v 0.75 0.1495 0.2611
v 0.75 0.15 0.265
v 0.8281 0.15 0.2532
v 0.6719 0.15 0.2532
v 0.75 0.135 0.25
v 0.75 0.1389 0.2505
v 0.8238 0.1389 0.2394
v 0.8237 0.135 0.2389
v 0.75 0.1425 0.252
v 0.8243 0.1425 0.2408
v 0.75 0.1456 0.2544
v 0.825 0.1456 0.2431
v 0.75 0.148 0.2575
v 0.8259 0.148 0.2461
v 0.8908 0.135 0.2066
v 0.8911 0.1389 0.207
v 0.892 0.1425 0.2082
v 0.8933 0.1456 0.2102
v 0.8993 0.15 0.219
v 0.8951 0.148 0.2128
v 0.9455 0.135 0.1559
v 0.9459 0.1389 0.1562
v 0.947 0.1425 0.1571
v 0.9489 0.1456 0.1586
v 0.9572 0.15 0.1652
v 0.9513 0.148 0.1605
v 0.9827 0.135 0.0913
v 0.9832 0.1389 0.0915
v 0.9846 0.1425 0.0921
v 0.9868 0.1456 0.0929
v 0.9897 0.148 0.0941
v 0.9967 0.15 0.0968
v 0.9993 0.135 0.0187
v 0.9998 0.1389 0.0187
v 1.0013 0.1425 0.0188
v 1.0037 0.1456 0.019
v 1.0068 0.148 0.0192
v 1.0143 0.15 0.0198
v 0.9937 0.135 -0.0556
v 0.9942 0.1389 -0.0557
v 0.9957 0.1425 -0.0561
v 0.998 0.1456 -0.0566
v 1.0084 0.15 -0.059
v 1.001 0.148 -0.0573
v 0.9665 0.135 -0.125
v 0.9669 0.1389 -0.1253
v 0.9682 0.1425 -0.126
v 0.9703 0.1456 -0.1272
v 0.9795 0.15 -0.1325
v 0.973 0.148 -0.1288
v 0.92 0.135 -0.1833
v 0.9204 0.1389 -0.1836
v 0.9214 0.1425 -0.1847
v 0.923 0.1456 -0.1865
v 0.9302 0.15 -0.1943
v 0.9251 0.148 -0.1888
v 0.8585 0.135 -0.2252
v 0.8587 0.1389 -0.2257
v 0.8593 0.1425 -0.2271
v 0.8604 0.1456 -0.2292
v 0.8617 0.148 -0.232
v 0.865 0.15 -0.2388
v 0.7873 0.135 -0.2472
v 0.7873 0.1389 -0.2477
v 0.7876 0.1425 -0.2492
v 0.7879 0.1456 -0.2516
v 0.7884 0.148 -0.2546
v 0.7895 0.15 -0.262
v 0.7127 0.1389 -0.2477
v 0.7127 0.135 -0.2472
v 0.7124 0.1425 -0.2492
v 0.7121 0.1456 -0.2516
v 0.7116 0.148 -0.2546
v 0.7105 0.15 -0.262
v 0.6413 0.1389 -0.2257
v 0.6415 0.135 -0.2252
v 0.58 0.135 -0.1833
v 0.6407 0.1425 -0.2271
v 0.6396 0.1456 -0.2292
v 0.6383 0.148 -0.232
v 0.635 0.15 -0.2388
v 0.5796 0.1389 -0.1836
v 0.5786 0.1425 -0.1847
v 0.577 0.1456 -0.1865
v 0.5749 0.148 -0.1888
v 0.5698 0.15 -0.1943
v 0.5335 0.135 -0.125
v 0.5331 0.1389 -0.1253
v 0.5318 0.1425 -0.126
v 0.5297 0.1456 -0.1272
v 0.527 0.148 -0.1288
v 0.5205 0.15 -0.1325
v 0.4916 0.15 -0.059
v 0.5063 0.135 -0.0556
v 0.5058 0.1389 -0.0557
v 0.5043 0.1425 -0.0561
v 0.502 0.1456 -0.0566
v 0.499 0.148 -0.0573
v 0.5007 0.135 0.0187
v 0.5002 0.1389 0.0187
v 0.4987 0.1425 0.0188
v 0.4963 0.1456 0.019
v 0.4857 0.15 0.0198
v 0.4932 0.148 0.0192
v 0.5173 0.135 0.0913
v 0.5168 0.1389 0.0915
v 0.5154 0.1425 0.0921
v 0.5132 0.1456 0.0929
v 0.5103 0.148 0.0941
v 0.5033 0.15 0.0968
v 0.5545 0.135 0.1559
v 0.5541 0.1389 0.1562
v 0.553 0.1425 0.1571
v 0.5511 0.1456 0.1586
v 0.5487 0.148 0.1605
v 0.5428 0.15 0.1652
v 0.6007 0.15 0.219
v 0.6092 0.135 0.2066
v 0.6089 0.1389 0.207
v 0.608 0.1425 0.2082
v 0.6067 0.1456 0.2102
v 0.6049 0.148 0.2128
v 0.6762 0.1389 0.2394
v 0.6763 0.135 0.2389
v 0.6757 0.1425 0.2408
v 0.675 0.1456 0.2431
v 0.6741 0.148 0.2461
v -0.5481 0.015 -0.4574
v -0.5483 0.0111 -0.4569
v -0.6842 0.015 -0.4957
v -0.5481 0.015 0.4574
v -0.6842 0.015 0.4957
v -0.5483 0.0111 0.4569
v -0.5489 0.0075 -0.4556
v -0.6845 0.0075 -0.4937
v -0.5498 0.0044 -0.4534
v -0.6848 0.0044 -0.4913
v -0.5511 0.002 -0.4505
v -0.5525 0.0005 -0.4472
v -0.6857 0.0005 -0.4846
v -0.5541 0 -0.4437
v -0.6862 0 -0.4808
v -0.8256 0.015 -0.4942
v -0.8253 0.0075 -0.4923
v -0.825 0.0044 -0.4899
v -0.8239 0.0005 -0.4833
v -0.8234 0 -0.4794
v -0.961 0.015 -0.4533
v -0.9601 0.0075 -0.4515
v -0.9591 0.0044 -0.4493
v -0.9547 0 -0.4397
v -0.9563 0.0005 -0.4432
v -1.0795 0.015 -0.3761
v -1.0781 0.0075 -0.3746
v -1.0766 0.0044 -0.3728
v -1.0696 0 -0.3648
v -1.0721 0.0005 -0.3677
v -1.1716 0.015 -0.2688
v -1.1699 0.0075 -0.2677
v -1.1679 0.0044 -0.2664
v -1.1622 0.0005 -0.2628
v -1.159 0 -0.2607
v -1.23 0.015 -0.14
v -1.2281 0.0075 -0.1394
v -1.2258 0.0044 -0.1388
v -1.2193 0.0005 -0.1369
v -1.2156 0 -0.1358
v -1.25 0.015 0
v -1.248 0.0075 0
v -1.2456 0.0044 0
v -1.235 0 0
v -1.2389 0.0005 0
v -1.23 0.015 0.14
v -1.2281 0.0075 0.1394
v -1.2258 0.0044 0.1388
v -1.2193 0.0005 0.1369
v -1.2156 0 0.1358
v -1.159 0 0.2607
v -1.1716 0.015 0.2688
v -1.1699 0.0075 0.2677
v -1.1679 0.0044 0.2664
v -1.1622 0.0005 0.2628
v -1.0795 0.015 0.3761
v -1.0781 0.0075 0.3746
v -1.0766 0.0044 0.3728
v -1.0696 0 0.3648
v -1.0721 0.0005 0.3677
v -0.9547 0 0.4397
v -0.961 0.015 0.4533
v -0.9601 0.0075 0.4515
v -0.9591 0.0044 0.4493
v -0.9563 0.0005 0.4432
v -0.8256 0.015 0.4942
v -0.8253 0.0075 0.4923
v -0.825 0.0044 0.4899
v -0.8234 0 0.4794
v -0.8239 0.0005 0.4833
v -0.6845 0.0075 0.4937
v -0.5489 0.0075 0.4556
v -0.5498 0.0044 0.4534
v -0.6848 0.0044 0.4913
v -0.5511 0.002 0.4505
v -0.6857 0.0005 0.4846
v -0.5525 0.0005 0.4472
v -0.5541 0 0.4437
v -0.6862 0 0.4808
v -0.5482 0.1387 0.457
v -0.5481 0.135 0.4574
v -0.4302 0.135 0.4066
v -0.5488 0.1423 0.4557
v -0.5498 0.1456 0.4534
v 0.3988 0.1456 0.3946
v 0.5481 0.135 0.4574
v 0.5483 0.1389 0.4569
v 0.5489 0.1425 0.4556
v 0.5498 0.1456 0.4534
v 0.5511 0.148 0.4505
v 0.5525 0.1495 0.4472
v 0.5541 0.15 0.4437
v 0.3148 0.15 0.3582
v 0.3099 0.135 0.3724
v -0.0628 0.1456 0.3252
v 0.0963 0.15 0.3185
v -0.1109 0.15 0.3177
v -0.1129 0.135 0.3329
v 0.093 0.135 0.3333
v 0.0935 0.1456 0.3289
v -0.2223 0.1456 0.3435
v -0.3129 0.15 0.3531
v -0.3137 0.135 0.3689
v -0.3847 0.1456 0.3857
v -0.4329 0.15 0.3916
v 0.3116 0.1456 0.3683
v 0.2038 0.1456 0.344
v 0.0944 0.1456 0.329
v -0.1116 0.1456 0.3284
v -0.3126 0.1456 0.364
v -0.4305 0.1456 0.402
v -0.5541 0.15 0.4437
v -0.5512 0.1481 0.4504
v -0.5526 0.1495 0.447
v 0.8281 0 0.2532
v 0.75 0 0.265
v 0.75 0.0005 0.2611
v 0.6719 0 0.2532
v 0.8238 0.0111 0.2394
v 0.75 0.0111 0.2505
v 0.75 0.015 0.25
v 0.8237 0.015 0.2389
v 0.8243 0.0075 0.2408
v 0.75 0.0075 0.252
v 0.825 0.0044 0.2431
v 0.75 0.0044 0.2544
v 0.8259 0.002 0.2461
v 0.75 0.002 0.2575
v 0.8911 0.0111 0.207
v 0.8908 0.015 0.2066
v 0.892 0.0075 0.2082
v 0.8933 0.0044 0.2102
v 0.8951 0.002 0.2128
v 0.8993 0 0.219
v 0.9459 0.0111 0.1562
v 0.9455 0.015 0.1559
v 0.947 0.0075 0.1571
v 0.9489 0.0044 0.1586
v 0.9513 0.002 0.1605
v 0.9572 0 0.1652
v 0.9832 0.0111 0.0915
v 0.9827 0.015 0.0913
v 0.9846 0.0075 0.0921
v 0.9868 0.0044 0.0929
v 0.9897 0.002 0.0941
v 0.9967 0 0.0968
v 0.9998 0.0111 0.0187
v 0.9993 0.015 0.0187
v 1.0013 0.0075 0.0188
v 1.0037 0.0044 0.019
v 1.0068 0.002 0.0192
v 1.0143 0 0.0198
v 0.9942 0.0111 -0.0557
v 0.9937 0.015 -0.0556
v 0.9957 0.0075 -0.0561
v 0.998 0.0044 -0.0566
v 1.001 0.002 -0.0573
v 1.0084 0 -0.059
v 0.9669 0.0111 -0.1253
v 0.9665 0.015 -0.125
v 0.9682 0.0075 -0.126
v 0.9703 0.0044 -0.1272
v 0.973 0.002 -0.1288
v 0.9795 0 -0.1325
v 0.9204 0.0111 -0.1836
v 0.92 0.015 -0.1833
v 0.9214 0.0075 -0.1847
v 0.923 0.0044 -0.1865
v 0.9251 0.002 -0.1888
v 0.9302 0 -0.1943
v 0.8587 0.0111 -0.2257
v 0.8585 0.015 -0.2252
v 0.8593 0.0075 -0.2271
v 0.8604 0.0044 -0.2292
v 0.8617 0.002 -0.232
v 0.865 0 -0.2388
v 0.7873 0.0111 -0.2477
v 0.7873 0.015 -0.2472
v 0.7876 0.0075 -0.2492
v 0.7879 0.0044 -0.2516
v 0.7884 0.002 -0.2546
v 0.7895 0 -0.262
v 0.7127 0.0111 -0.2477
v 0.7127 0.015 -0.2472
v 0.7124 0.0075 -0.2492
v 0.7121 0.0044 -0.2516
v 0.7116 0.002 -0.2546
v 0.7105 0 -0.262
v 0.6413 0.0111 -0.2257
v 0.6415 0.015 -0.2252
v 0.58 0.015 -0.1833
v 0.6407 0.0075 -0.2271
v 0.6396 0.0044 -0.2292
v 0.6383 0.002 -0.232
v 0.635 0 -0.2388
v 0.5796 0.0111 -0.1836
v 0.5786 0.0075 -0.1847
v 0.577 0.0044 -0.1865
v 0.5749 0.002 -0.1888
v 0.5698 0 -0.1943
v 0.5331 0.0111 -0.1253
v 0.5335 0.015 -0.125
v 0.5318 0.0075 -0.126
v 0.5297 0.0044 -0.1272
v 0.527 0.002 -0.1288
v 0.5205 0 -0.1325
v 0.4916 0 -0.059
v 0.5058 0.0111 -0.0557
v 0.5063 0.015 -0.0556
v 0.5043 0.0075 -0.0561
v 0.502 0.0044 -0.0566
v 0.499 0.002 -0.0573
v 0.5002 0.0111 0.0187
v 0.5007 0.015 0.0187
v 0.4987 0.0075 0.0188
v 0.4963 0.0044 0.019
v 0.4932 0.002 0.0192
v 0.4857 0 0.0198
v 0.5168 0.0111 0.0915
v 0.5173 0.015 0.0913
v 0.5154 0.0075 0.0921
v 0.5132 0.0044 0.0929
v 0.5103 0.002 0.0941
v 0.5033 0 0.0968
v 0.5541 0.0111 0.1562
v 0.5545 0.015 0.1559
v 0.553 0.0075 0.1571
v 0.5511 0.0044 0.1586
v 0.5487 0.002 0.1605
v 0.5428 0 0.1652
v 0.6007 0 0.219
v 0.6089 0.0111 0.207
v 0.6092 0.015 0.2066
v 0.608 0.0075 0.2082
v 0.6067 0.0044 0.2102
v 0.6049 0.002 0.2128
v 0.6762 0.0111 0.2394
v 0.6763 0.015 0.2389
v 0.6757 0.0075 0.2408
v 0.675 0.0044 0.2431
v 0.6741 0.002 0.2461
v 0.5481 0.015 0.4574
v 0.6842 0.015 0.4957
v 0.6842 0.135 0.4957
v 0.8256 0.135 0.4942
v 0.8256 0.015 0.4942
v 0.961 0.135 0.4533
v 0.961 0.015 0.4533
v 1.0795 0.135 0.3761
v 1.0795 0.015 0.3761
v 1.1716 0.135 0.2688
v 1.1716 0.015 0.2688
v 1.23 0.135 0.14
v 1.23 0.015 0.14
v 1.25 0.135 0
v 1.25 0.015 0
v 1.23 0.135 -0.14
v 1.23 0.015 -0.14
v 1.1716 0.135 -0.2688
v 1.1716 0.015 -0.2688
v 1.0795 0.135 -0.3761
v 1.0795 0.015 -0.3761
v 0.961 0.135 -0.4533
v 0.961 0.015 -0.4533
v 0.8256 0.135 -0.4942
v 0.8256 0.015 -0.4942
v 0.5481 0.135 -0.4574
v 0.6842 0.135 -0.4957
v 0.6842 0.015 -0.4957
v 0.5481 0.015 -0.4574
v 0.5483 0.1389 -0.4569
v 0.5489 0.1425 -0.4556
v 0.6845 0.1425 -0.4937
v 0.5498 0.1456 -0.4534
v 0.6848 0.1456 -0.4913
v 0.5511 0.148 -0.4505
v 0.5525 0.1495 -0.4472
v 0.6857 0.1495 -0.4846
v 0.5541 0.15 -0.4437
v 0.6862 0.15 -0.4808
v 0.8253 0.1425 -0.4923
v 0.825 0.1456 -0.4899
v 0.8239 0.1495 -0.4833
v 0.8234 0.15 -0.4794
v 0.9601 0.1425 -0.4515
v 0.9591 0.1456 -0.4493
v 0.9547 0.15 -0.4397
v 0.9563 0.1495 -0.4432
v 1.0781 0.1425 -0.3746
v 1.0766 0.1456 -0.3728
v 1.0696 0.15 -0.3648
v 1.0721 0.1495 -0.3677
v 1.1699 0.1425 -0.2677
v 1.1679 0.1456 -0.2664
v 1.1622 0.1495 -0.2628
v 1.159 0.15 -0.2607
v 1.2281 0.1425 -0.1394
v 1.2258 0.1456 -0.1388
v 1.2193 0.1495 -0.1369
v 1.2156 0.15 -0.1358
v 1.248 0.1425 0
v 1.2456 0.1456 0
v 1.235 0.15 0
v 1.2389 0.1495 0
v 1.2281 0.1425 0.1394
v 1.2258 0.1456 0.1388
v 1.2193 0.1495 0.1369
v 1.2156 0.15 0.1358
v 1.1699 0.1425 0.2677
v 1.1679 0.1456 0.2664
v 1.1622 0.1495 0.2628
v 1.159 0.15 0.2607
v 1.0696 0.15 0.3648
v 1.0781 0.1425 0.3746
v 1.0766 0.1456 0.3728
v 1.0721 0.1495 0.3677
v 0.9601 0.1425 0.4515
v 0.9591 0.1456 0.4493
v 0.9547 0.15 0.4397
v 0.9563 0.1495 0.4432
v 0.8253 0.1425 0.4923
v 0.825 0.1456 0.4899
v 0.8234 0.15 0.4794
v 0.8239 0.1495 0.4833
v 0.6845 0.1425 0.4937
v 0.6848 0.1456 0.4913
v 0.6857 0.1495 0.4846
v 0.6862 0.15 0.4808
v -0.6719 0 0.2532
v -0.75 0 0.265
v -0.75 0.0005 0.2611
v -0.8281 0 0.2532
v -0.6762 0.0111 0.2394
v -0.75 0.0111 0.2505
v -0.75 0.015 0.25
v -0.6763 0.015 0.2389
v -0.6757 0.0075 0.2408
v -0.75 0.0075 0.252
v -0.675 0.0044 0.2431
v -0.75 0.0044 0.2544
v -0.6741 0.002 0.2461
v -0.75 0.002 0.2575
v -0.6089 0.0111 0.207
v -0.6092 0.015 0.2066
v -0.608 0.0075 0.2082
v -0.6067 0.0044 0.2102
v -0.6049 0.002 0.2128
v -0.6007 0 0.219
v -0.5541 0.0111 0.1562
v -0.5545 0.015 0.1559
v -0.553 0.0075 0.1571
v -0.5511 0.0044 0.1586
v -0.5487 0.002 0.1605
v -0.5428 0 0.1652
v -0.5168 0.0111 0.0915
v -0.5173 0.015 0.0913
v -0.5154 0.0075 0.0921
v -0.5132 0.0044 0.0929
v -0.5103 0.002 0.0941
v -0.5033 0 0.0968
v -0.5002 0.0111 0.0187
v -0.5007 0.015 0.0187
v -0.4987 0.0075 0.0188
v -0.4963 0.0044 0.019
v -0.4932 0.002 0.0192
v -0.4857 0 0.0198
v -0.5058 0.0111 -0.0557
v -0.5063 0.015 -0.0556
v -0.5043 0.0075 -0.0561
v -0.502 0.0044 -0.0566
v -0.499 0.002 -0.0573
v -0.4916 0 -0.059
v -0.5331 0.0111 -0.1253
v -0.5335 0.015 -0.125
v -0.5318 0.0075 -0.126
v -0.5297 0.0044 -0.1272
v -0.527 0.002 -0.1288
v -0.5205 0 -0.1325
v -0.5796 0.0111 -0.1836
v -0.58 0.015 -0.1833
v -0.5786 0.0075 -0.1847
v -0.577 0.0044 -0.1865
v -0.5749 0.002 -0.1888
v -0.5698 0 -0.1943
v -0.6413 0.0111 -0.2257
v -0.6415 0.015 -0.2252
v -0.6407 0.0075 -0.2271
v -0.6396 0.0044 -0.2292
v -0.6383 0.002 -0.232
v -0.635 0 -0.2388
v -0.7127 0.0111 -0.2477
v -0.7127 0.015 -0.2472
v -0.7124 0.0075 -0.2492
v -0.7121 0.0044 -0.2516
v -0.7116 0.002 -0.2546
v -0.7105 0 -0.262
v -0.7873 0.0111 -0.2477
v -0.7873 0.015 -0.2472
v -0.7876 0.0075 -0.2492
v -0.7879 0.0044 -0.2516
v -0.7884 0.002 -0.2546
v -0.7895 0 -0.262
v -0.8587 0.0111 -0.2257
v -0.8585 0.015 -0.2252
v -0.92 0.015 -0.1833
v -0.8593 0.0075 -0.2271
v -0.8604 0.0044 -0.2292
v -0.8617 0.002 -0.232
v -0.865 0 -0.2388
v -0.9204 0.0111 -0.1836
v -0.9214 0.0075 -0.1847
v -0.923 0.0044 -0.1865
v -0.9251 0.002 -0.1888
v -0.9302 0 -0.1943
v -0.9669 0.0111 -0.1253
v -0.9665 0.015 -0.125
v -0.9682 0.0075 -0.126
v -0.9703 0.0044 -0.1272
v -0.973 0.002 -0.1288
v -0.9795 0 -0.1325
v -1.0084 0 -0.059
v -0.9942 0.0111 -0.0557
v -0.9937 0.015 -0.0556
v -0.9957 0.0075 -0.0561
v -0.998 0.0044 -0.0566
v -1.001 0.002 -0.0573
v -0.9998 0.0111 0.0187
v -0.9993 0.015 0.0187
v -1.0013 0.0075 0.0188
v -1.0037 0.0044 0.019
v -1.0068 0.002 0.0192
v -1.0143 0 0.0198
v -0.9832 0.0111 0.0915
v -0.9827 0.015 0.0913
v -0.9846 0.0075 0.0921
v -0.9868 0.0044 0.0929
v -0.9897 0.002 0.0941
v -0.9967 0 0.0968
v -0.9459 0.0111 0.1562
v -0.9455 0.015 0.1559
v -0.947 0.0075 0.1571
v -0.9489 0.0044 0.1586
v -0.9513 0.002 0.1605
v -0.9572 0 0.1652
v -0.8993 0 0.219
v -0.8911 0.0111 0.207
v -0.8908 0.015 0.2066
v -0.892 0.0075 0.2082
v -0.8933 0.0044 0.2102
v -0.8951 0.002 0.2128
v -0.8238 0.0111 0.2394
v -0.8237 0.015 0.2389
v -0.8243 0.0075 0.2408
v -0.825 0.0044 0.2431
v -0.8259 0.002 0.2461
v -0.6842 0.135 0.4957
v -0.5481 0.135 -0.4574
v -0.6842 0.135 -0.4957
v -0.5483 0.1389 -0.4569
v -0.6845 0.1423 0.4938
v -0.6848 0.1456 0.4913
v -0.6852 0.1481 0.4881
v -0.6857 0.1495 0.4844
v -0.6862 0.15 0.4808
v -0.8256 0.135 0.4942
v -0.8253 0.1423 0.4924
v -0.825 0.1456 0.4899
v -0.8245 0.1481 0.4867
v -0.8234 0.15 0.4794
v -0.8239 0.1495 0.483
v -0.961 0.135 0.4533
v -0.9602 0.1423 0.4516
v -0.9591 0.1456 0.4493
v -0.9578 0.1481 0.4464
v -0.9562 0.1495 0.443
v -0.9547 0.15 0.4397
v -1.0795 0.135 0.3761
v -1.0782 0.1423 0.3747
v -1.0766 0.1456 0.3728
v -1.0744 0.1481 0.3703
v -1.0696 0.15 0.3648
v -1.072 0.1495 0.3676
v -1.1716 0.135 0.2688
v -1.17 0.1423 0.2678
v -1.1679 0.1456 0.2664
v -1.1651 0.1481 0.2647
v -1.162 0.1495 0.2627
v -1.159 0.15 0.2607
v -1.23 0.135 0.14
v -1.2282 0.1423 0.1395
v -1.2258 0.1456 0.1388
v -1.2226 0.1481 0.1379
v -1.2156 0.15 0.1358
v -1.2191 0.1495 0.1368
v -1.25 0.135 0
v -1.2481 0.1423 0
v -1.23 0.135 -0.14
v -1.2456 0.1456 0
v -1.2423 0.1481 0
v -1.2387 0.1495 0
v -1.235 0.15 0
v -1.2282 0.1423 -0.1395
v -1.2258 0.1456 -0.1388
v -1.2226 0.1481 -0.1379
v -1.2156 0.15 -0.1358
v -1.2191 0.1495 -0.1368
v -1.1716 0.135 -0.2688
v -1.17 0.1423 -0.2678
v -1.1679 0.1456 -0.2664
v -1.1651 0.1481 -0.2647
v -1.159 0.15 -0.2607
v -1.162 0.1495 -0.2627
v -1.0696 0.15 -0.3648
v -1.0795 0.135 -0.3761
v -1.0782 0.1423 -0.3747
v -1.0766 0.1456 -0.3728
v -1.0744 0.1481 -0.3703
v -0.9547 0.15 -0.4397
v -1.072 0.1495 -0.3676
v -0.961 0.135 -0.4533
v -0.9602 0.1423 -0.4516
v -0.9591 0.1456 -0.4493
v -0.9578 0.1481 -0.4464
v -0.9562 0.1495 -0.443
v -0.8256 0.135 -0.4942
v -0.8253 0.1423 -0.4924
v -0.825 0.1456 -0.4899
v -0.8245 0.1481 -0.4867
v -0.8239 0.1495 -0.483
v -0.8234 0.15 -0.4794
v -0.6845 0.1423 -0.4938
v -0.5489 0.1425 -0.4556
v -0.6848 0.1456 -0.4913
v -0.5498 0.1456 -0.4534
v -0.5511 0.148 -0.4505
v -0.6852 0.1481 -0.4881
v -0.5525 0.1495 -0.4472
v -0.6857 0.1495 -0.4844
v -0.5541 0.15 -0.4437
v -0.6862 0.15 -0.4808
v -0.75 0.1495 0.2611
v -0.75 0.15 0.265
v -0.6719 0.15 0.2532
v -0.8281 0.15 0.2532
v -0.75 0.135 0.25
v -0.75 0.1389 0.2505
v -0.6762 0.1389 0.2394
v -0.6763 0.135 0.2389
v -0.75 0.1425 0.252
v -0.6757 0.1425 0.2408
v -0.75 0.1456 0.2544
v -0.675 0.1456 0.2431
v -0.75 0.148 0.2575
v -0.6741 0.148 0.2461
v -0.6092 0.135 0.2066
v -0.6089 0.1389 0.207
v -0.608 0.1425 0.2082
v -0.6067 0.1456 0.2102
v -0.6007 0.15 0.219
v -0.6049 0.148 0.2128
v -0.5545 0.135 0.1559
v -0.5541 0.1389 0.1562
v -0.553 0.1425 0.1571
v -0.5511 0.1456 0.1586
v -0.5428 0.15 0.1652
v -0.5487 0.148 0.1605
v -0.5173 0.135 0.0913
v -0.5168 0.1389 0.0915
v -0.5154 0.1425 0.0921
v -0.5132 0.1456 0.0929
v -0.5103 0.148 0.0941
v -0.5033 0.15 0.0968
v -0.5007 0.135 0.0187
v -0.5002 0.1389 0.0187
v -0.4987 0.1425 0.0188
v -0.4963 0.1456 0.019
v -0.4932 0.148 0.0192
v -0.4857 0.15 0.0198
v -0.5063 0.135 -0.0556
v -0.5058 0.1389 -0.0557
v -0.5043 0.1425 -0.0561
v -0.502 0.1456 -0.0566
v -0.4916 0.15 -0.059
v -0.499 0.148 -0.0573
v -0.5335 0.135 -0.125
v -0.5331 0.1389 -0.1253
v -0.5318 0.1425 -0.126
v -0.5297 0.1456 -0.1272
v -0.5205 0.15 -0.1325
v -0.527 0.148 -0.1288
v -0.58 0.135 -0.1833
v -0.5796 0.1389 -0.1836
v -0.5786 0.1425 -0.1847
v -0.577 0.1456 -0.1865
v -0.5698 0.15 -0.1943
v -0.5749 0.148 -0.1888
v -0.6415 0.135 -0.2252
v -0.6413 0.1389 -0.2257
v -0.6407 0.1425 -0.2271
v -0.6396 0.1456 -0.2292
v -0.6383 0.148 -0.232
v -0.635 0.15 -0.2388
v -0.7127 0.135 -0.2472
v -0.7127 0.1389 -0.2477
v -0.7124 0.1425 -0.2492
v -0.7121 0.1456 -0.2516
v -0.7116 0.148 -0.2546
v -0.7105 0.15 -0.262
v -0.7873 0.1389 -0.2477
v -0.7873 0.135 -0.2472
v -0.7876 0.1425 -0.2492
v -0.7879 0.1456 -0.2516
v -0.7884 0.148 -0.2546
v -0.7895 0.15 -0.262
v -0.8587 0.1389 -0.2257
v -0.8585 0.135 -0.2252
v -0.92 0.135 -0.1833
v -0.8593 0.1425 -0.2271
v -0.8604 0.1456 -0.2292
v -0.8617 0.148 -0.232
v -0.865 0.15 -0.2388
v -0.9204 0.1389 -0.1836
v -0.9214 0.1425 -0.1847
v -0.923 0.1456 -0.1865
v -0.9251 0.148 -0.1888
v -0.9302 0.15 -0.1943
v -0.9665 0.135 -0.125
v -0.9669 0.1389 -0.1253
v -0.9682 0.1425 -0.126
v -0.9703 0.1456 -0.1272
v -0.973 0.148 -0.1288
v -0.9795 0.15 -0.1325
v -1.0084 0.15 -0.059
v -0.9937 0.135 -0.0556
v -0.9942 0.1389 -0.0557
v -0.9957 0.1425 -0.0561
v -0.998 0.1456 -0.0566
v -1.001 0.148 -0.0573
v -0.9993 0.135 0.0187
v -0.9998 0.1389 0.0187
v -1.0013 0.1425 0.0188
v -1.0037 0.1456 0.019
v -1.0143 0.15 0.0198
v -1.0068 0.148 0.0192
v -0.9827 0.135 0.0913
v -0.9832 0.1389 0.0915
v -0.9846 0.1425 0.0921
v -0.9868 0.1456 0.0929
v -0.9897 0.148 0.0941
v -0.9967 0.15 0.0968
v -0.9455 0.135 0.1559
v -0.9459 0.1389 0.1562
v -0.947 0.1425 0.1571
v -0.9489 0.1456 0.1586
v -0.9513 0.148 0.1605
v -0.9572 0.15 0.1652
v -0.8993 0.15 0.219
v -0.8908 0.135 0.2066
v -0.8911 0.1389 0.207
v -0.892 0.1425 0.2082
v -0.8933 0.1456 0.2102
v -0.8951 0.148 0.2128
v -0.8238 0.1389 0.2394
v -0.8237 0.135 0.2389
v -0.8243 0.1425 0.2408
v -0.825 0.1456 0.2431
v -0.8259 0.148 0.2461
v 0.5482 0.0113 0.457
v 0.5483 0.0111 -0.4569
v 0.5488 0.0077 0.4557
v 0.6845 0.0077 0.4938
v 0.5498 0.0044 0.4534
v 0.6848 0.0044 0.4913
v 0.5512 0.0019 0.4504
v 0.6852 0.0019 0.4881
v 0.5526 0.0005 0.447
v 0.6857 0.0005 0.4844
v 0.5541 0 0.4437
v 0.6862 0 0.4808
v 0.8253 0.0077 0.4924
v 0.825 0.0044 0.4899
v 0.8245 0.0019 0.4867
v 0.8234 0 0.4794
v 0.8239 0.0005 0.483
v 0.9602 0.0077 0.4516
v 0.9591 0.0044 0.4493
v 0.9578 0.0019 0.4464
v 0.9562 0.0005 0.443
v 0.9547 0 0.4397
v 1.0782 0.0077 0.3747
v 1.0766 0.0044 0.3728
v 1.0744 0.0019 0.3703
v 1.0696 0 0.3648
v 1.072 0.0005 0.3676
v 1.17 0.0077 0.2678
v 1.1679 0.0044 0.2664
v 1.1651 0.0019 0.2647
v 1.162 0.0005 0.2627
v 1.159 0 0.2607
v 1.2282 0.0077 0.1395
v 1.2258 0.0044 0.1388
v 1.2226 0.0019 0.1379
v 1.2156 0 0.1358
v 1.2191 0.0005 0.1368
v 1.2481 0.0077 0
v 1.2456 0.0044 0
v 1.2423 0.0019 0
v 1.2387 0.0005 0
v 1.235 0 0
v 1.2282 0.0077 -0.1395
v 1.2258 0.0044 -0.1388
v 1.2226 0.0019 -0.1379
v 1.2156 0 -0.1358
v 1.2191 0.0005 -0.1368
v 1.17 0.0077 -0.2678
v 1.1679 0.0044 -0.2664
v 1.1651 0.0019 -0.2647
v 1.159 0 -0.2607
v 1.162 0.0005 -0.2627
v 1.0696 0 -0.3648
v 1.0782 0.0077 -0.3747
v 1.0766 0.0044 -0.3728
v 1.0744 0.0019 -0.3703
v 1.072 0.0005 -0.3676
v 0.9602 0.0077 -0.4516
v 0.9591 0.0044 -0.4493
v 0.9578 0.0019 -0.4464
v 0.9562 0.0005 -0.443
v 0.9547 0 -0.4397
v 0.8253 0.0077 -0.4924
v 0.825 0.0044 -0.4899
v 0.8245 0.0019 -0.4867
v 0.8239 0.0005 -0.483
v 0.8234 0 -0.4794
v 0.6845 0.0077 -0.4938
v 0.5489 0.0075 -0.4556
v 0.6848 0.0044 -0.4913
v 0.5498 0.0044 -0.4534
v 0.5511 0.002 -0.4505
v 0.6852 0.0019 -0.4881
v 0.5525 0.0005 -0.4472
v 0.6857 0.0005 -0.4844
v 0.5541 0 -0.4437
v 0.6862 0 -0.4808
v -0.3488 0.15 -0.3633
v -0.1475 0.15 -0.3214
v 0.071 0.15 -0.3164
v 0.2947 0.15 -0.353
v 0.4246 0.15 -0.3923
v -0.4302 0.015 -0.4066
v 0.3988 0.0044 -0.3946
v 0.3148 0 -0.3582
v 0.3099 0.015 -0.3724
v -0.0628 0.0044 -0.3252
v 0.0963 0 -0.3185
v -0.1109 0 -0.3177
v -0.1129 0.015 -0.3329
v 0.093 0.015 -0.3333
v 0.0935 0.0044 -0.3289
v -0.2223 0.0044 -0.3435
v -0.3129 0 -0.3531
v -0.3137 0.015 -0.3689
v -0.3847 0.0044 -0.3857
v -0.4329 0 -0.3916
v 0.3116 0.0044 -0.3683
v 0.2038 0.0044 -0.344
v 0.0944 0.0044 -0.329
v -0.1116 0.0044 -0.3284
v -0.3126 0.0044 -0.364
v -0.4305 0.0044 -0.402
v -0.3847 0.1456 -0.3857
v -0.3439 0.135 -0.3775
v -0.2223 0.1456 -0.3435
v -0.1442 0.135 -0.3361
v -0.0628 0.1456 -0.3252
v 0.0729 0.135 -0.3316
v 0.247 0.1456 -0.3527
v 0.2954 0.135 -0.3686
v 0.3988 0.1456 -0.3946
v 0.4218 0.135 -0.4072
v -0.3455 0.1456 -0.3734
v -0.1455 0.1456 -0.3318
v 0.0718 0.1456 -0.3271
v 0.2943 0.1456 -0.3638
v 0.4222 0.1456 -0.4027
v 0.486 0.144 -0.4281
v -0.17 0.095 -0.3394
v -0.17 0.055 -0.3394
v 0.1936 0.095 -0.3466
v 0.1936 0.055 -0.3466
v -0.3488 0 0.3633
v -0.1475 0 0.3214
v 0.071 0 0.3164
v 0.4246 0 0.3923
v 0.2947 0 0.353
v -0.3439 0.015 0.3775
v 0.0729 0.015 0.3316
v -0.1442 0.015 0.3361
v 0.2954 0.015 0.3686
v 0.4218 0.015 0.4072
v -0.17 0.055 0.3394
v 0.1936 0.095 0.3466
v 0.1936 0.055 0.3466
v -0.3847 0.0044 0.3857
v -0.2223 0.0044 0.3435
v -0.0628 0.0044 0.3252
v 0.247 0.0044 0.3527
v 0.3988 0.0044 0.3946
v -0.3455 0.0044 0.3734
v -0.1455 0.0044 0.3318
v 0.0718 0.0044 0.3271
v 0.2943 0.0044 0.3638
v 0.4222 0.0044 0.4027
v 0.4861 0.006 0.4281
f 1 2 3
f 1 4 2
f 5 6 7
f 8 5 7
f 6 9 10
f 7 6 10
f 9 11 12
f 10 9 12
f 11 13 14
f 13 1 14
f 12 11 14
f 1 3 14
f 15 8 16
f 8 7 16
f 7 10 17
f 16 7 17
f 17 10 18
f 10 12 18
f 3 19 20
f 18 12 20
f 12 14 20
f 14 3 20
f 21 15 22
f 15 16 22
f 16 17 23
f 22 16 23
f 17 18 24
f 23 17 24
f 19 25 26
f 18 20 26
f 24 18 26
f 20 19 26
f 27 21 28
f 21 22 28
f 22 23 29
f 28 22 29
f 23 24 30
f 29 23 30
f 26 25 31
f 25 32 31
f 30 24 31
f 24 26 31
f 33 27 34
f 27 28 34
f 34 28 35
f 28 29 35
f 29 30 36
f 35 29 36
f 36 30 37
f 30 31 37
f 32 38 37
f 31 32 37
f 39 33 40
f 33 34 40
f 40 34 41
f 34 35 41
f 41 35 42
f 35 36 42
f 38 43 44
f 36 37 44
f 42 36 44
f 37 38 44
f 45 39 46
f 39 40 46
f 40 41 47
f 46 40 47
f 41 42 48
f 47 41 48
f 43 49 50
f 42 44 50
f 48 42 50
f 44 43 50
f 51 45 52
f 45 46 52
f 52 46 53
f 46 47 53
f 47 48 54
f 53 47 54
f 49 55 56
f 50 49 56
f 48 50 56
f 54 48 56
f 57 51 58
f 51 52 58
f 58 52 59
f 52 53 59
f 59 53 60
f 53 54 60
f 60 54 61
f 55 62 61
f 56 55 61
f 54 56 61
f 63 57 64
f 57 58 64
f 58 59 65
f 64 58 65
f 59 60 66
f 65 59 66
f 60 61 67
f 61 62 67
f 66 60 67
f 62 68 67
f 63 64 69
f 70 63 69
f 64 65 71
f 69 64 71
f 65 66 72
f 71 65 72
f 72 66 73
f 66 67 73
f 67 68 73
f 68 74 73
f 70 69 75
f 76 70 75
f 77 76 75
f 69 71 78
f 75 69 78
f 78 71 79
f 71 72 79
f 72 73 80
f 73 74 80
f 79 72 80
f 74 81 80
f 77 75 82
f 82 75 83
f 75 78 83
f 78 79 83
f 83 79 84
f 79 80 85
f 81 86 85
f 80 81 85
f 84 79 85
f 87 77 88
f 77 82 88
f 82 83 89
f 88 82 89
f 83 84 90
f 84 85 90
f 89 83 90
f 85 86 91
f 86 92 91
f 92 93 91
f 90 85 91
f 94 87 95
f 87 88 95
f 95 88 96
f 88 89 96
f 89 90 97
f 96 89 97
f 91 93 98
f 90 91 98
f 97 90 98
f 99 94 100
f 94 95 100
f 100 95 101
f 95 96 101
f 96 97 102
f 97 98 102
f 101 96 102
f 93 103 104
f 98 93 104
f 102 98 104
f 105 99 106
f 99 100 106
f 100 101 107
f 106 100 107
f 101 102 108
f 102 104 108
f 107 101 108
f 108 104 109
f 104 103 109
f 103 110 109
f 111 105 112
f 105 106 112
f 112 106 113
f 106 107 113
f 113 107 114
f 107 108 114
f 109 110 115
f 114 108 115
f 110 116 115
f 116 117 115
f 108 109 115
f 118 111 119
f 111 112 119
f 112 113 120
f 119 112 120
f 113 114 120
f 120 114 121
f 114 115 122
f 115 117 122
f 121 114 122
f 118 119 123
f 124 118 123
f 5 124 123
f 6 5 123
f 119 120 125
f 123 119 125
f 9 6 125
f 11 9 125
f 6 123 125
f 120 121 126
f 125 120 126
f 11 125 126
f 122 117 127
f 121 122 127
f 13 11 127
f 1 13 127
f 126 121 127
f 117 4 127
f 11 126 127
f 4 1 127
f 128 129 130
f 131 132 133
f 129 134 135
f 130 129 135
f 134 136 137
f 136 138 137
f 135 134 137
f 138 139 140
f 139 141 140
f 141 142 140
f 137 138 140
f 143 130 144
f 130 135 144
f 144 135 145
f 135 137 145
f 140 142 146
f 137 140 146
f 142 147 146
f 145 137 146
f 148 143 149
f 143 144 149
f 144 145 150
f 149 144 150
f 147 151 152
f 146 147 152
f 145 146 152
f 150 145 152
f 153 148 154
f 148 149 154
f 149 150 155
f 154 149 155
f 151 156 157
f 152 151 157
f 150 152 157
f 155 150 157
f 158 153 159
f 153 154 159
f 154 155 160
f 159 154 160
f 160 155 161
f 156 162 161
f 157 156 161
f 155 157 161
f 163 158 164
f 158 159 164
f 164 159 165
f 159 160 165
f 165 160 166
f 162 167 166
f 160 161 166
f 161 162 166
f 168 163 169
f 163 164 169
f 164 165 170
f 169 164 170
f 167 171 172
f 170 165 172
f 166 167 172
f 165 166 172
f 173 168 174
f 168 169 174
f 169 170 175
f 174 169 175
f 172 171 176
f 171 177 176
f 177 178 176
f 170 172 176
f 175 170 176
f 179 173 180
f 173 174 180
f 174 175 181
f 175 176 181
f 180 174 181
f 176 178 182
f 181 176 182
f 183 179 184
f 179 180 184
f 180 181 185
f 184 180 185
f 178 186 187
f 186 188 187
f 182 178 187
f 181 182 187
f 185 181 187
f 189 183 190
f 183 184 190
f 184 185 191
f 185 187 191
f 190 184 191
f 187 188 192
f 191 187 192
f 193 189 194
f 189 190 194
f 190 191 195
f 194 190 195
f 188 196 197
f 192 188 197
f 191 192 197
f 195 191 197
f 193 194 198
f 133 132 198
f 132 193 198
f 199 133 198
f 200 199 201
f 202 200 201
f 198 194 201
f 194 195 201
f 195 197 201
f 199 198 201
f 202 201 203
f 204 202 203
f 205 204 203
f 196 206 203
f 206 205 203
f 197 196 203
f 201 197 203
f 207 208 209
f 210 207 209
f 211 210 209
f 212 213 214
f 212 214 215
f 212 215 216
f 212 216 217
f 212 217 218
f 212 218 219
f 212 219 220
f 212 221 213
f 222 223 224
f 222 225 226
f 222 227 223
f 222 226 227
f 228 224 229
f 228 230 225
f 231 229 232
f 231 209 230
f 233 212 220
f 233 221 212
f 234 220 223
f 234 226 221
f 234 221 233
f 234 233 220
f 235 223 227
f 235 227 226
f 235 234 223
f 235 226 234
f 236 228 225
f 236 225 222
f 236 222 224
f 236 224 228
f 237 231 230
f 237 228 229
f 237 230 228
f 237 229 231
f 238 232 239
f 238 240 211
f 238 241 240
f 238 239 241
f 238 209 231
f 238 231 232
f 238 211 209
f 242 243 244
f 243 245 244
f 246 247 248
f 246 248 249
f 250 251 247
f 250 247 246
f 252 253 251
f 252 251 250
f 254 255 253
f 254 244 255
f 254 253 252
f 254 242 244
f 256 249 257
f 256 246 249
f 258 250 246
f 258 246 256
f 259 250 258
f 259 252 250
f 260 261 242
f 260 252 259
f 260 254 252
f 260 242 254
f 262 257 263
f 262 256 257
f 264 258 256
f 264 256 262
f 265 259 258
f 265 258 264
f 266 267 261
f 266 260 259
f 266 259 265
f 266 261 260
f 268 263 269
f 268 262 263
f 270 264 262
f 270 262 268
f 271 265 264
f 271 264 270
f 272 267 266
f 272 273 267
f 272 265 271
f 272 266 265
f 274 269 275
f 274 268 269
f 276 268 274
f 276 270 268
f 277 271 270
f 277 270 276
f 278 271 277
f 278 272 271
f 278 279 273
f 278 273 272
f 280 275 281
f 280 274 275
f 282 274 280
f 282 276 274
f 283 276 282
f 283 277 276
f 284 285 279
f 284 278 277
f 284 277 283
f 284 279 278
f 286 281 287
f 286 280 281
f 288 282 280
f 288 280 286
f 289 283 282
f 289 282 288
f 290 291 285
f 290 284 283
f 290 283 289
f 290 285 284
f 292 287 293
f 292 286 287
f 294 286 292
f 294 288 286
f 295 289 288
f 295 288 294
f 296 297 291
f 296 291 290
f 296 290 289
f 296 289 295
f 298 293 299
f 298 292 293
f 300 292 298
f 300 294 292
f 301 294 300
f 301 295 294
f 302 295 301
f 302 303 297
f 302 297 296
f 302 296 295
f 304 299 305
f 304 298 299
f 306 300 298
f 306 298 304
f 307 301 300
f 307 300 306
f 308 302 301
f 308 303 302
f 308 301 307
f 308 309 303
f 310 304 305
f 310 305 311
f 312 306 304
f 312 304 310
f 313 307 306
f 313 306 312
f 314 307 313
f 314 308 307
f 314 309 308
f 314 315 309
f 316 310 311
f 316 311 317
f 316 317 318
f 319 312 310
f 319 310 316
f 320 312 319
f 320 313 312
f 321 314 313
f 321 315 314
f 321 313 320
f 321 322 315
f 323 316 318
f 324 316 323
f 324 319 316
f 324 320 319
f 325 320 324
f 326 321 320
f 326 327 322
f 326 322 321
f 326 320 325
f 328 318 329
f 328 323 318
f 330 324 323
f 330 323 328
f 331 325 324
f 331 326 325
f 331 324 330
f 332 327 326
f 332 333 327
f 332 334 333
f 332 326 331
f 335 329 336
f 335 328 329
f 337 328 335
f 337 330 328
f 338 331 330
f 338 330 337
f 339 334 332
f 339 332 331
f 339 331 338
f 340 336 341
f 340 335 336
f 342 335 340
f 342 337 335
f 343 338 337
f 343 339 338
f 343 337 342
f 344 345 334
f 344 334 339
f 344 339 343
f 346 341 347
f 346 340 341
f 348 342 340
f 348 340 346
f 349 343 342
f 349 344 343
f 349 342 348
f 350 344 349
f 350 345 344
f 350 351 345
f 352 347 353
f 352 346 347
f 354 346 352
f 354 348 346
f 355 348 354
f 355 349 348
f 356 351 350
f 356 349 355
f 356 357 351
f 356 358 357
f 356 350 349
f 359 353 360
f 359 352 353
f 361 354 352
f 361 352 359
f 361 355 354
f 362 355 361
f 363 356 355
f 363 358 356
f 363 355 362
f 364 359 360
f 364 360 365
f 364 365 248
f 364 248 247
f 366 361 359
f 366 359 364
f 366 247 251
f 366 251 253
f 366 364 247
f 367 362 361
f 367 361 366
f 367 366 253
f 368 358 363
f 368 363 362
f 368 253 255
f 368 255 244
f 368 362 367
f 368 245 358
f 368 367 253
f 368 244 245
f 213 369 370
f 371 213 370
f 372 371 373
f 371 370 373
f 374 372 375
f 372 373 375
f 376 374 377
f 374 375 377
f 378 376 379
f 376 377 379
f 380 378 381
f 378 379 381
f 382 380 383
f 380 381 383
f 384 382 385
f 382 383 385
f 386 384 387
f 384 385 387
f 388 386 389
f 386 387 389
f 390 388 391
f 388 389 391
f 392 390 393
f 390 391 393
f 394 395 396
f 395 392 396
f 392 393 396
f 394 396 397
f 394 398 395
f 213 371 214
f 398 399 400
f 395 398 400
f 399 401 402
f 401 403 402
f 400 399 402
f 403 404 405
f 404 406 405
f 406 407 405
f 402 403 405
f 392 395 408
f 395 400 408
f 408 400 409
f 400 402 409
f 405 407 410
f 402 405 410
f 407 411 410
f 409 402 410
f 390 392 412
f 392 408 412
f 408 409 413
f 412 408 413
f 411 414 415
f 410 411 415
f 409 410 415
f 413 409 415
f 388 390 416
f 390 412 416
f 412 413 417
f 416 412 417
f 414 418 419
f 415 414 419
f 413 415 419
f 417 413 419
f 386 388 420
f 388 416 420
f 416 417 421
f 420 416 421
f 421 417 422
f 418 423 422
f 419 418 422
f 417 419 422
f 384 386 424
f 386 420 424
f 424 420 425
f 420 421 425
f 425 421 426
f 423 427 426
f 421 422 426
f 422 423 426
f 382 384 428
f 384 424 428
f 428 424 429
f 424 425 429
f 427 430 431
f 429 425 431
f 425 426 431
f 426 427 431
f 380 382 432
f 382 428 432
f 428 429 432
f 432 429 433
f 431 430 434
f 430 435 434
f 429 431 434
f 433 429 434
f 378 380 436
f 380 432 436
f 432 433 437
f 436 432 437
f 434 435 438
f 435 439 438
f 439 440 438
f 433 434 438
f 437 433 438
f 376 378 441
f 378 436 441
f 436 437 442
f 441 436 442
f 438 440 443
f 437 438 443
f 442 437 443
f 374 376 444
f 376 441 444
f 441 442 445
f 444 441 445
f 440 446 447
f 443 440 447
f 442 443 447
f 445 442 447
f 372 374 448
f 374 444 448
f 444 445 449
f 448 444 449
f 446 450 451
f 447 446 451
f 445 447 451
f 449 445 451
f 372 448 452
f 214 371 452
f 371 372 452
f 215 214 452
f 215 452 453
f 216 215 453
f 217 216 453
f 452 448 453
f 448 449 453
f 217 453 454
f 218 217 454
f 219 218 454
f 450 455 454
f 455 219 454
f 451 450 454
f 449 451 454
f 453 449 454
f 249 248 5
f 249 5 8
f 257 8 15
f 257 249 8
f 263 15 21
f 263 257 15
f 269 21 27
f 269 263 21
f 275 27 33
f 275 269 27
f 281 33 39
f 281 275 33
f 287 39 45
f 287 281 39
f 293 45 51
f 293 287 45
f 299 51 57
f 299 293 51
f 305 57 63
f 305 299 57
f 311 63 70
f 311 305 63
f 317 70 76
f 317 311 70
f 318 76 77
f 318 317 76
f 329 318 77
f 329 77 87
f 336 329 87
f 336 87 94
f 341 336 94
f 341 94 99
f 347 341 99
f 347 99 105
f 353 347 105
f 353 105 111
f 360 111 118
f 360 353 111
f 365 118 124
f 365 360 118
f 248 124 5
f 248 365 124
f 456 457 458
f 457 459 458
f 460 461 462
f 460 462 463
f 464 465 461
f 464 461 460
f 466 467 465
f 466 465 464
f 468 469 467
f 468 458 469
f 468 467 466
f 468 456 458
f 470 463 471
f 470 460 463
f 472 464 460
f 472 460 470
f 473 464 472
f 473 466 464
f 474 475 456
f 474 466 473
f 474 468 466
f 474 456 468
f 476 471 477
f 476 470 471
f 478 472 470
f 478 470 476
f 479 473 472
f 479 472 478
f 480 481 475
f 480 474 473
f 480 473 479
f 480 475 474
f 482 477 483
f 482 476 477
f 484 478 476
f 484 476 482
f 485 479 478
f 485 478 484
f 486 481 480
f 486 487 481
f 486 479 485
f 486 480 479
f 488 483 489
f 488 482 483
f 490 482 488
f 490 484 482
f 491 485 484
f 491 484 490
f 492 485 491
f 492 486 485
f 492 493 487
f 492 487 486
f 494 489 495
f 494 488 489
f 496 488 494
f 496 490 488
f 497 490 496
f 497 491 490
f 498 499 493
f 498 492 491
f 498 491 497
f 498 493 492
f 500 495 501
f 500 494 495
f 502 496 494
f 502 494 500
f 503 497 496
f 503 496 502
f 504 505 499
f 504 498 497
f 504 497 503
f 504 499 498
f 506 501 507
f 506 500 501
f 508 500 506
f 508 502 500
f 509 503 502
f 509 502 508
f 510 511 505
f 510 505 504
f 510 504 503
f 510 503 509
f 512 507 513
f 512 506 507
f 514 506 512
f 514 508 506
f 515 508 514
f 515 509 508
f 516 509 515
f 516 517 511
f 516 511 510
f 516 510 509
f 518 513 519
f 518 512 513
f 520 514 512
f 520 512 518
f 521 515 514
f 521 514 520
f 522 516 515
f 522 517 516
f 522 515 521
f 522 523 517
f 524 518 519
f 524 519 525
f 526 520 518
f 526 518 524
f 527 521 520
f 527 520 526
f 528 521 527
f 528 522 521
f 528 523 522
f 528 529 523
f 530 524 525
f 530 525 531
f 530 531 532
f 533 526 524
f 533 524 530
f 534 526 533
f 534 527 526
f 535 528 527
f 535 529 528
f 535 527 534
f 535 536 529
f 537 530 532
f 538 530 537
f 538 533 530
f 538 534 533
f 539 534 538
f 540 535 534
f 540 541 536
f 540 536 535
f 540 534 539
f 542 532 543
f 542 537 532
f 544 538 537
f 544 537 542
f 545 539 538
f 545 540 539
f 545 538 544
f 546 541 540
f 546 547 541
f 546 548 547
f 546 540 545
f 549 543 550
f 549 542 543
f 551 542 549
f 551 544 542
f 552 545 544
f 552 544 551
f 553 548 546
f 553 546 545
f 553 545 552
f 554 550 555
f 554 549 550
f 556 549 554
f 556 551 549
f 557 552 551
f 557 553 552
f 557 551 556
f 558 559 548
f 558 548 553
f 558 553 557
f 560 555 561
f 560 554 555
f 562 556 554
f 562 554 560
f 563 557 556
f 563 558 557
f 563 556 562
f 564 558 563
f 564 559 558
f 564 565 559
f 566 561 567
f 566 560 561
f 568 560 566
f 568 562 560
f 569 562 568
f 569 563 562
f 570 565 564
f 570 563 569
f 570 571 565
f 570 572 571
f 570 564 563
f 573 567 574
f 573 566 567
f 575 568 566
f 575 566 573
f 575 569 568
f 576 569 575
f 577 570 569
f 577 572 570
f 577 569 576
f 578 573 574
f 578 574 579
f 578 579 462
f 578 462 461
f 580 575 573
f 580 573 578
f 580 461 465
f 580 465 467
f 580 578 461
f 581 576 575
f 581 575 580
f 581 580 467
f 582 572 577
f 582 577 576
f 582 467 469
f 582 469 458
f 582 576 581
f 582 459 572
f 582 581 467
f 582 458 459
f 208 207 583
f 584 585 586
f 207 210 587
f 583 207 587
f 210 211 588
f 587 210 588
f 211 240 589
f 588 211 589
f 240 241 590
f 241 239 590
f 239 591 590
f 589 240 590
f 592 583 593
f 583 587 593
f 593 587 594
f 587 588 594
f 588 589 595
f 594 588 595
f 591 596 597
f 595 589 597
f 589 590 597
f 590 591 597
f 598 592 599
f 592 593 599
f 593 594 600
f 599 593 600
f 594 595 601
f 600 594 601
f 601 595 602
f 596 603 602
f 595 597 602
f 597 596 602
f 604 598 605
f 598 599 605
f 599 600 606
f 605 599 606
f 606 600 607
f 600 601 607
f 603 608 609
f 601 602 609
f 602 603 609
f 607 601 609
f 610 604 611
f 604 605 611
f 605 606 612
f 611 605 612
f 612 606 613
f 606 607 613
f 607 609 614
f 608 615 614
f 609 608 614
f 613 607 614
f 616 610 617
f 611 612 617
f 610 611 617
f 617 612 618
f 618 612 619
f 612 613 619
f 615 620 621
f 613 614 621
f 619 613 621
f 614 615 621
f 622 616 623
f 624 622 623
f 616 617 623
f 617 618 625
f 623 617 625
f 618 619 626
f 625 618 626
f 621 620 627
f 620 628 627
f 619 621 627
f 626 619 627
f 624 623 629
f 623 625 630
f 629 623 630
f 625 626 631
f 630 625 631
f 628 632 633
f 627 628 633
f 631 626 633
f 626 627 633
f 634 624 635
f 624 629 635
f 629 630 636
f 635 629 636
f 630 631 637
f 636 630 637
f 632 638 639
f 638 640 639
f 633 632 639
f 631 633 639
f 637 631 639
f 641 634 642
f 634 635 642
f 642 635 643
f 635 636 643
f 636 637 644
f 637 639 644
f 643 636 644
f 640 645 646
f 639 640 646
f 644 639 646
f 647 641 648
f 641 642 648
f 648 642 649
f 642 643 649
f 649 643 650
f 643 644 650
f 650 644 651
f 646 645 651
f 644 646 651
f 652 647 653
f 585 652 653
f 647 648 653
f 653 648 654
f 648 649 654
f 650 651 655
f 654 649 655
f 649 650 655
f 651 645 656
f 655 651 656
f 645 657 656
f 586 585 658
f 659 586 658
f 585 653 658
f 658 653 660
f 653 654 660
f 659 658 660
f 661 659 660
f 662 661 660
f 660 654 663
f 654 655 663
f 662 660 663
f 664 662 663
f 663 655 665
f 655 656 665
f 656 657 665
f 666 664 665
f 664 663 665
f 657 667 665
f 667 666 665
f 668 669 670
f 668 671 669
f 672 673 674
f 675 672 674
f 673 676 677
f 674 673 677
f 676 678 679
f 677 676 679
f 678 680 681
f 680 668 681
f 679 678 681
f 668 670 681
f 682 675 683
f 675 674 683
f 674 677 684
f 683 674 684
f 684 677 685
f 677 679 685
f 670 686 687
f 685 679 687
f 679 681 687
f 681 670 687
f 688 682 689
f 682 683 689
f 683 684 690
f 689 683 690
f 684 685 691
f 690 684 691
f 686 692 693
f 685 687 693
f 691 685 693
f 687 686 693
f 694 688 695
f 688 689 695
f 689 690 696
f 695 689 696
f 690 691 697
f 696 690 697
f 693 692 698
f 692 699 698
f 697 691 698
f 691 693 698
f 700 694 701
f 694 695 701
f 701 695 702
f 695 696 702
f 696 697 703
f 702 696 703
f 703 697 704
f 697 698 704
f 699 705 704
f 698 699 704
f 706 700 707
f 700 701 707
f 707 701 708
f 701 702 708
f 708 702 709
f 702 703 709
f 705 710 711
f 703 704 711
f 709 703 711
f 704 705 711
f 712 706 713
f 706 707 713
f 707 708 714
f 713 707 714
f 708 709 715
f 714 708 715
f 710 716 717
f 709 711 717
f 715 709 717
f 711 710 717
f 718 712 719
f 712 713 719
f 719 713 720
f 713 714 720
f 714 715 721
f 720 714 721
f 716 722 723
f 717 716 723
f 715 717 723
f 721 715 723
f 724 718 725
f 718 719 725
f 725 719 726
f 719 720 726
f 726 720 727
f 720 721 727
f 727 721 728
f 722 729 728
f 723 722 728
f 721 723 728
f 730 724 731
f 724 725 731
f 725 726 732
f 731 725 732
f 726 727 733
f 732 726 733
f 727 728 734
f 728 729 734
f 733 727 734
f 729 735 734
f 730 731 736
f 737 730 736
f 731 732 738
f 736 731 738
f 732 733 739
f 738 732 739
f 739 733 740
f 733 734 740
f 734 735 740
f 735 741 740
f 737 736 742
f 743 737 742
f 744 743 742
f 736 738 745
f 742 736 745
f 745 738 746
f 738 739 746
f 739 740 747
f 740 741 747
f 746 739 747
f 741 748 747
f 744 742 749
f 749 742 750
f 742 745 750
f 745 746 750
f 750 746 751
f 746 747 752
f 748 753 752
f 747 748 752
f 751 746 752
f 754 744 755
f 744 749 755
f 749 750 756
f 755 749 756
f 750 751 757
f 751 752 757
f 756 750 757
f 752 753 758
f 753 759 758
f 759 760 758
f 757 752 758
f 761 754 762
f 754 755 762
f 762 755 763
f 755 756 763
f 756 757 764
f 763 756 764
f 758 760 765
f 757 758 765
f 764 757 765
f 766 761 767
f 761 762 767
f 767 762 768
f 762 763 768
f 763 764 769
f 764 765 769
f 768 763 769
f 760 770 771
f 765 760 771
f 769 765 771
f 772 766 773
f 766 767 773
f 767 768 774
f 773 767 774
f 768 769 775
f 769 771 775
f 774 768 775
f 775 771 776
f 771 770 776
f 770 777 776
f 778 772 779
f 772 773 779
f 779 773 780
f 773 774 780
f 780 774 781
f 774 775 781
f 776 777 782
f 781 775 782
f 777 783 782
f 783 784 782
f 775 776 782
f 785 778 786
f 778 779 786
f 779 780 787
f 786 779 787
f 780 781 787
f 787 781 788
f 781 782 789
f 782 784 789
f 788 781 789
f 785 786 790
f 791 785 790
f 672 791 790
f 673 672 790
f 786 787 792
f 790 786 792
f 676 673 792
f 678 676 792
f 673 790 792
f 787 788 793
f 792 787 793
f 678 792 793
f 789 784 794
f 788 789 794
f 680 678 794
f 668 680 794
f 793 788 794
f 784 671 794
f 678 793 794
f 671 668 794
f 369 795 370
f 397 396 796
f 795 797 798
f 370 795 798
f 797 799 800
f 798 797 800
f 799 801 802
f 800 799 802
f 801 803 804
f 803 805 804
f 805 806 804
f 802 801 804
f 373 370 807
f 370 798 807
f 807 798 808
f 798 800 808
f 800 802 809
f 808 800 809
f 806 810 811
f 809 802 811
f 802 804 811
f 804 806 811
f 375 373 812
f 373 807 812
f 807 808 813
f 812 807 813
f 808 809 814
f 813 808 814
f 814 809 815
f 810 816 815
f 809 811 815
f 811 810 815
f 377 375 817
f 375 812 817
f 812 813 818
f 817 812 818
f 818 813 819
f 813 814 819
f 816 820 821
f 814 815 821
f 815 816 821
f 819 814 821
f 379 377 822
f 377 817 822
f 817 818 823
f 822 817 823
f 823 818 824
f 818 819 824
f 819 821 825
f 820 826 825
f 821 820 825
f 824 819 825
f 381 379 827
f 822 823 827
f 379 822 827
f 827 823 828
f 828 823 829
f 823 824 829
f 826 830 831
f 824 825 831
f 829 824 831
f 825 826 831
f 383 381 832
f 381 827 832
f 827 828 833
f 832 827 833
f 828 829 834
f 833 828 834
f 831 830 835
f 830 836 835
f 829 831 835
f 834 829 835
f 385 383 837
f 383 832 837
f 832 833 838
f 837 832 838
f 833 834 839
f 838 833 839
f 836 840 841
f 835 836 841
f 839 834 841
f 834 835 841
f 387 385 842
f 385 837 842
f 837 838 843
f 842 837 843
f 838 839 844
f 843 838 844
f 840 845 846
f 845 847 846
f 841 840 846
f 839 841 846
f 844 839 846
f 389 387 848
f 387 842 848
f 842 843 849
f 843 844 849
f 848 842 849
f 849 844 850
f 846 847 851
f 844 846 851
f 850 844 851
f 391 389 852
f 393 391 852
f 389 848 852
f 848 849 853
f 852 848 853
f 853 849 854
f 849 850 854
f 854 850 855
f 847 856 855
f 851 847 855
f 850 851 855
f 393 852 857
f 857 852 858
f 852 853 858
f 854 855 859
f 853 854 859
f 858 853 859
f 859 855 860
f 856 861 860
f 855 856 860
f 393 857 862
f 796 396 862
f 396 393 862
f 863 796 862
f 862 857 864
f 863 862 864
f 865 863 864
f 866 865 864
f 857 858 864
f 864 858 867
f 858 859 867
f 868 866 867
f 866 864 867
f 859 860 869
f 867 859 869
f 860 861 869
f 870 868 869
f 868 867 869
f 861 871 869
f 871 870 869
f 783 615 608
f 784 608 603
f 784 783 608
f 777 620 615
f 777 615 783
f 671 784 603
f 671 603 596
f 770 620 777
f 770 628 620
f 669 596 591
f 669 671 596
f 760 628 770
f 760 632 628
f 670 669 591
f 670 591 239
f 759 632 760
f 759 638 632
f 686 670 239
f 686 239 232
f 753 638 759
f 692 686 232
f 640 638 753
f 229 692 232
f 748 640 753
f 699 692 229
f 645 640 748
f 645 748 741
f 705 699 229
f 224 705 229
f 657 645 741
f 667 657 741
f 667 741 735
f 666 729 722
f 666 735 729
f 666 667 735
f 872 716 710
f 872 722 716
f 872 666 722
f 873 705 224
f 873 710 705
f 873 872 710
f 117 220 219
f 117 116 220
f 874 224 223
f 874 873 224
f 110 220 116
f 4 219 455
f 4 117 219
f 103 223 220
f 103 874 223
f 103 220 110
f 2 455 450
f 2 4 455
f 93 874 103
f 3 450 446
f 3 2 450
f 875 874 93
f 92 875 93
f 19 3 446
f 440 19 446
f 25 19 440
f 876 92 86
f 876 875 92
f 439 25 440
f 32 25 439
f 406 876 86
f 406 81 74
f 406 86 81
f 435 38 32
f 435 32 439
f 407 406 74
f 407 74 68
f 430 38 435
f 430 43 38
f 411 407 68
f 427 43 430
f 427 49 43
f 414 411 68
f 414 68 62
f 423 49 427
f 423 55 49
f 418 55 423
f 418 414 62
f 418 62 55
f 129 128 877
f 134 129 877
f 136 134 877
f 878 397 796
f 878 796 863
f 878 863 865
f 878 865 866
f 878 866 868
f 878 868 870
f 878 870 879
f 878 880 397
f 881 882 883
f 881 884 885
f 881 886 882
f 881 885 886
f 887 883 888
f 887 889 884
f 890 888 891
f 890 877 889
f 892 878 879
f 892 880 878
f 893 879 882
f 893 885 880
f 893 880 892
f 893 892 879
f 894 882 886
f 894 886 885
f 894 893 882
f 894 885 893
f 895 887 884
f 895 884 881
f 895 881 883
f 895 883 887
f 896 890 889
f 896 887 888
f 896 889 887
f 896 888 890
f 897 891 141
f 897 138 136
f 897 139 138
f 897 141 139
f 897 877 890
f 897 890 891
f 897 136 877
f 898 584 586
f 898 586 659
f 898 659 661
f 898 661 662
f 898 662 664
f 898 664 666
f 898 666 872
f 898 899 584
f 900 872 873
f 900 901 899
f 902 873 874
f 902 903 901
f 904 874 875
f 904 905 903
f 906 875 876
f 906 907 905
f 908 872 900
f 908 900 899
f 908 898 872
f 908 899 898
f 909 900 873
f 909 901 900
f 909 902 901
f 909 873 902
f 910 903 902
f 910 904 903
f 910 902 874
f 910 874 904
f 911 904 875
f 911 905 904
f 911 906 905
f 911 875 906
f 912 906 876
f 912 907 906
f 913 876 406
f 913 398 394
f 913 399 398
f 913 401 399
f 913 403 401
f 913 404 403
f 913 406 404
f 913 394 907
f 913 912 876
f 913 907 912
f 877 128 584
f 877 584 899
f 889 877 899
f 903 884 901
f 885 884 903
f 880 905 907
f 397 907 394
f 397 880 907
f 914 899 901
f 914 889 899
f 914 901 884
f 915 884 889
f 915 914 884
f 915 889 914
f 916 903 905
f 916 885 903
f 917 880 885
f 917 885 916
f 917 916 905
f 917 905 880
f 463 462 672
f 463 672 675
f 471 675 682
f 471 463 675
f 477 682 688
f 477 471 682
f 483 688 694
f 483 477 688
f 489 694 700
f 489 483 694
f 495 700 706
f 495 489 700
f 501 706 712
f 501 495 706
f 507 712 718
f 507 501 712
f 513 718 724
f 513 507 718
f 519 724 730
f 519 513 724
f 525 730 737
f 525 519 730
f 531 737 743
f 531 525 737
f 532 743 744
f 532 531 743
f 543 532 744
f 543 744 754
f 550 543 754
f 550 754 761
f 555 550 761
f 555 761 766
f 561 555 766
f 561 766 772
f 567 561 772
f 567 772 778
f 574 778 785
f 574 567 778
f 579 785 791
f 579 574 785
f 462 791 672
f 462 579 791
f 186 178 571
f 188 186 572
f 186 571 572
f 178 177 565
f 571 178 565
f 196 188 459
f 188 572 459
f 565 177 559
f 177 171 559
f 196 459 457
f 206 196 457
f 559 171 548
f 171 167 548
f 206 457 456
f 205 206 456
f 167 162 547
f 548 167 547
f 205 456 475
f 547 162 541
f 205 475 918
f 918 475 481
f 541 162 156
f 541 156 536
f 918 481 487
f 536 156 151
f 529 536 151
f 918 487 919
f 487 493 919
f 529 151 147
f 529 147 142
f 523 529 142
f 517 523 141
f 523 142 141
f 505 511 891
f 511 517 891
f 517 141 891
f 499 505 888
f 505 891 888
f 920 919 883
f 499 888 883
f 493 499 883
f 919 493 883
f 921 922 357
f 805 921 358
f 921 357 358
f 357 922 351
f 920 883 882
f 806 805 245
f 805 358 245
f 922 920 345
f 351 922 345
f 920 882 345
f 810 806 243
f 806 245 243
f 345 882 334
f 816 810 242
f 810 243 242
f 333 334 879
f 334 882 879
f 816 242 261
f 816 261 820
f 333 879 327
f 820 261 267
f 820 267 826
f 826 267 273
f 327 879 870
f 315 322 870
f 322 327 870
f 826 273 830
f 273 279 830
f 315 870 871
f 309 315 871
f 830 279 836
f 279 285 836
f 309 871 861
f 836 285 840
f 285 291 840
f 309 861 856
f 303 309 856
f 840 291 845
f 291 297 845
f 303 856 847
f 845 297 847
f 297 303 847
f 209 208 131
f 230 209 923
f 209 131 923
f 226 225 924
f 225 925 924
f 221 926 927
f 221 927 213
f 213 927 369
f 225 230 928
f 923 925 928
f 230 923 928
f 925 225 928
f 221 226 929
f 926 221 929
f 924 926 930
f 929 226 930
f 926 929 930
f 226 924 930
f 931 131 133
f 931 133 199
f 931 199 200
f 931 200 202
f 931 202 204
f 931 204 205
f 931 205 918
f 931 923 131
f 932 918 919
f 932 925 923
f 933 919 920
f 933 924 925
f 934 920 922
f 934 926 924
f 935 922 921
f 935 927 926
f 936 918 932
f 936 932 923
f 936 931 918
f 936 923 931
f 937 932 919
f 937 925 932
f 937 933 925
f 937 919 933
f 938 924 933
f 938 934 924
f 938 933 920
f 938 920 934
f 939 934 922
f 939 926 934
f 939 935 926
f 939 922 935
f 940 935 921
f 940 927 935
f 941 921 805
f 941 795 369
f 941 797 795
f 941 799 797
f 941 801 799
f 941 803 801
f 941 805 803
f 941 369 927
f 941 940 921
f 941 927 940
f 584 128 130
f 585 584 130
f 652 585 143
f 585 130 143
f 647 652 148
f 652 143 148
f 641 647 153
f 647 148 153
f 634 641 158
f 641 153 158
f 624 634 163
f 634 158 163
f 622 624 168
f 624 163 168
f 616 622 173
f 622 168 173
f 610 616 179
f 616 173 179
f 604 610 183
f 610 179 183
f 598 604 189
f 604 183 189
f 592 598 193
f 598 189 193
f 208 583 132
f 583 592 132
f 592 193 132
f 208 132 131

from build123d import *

# Parameters (mm, degrees)
SKETCH2_R           = 0.25
BOSS_EXTRUDE1_DEPTH = 0.15
FILLET1_R           = 0.015


with BuildPart() as part:
    # Sketch2 → Boss-Extrude1 (new body)
    with BuildSketch(Plane(origin=(0, 0, 0), x_dir=(1, 0, 0), z_dir=(0, 1, 0))):
        with BuildLine():
            ThreePointArc((-0.548055874, 0.457404165), (-1.25, 0), (-0.548055874, -0.457404165))
            add(Edge.make_bspline(
                [(-0.548055874, -0.457404165), (-0.160967029, -0.26957617), (0.196289379, -0.302099114), (0.548055874, -0.457404165)],
                knots=[0, 0, 0, 0, 1, 1, 1, 1], degree=3))
            ThreePointArc((0.548055874, -0.457404165), (1.25, 0), (0.548055874, 0.457404165))
            add(Edge.make_bspline(
                [(-0.548055874, 0.457404165), (-0.160967029, 0.26957617), (0.196289379, 0.302099114), (0.548055874, 0.457404165)],
                knots=[0, 0, 0, 0, 1, 1, 1, 1], degree=3))
        make_face()
        with Locations(Location((-0.75, 0, 0), (0, 0, 270))):
            Circle(SKETCH2_R, mode=Mode.SUBTRACT)
        with Locations(Location((0.75, 0, 0), (0, 0, 270))):
            Circle(SKETCH2_R, mode=Mode.SUBTRACT)
    extrude(amount=BOSS_EXTRUDE1_DEPTH)

    # Fillet1
    fillet1_edges = [part.edges().sort_by_distance(p)[0] for p in [
        (-0.000624211, 0.15, -0.32850252),
        (-0.75, 0, -0.25),
        (-0.75, 0.15, -0.25),
        (-1.25, 0.15, 0),
        (0.75, 0, -0.25),
        (0.75, 0.15, -0.25),
        (-0.000624211, 0.15, 0.32850252),
        (-1.25, 0, 0),
        (-0.000624211, 0, -0.32850252),
        (1.25, 0, 0),
        (-0.000624211, 0, 0.32850252),
        (1.25, 0.15, 0),
    ]]
    fillet(fillet1_edges, radius=FILLET1_R)


solid = part.part
